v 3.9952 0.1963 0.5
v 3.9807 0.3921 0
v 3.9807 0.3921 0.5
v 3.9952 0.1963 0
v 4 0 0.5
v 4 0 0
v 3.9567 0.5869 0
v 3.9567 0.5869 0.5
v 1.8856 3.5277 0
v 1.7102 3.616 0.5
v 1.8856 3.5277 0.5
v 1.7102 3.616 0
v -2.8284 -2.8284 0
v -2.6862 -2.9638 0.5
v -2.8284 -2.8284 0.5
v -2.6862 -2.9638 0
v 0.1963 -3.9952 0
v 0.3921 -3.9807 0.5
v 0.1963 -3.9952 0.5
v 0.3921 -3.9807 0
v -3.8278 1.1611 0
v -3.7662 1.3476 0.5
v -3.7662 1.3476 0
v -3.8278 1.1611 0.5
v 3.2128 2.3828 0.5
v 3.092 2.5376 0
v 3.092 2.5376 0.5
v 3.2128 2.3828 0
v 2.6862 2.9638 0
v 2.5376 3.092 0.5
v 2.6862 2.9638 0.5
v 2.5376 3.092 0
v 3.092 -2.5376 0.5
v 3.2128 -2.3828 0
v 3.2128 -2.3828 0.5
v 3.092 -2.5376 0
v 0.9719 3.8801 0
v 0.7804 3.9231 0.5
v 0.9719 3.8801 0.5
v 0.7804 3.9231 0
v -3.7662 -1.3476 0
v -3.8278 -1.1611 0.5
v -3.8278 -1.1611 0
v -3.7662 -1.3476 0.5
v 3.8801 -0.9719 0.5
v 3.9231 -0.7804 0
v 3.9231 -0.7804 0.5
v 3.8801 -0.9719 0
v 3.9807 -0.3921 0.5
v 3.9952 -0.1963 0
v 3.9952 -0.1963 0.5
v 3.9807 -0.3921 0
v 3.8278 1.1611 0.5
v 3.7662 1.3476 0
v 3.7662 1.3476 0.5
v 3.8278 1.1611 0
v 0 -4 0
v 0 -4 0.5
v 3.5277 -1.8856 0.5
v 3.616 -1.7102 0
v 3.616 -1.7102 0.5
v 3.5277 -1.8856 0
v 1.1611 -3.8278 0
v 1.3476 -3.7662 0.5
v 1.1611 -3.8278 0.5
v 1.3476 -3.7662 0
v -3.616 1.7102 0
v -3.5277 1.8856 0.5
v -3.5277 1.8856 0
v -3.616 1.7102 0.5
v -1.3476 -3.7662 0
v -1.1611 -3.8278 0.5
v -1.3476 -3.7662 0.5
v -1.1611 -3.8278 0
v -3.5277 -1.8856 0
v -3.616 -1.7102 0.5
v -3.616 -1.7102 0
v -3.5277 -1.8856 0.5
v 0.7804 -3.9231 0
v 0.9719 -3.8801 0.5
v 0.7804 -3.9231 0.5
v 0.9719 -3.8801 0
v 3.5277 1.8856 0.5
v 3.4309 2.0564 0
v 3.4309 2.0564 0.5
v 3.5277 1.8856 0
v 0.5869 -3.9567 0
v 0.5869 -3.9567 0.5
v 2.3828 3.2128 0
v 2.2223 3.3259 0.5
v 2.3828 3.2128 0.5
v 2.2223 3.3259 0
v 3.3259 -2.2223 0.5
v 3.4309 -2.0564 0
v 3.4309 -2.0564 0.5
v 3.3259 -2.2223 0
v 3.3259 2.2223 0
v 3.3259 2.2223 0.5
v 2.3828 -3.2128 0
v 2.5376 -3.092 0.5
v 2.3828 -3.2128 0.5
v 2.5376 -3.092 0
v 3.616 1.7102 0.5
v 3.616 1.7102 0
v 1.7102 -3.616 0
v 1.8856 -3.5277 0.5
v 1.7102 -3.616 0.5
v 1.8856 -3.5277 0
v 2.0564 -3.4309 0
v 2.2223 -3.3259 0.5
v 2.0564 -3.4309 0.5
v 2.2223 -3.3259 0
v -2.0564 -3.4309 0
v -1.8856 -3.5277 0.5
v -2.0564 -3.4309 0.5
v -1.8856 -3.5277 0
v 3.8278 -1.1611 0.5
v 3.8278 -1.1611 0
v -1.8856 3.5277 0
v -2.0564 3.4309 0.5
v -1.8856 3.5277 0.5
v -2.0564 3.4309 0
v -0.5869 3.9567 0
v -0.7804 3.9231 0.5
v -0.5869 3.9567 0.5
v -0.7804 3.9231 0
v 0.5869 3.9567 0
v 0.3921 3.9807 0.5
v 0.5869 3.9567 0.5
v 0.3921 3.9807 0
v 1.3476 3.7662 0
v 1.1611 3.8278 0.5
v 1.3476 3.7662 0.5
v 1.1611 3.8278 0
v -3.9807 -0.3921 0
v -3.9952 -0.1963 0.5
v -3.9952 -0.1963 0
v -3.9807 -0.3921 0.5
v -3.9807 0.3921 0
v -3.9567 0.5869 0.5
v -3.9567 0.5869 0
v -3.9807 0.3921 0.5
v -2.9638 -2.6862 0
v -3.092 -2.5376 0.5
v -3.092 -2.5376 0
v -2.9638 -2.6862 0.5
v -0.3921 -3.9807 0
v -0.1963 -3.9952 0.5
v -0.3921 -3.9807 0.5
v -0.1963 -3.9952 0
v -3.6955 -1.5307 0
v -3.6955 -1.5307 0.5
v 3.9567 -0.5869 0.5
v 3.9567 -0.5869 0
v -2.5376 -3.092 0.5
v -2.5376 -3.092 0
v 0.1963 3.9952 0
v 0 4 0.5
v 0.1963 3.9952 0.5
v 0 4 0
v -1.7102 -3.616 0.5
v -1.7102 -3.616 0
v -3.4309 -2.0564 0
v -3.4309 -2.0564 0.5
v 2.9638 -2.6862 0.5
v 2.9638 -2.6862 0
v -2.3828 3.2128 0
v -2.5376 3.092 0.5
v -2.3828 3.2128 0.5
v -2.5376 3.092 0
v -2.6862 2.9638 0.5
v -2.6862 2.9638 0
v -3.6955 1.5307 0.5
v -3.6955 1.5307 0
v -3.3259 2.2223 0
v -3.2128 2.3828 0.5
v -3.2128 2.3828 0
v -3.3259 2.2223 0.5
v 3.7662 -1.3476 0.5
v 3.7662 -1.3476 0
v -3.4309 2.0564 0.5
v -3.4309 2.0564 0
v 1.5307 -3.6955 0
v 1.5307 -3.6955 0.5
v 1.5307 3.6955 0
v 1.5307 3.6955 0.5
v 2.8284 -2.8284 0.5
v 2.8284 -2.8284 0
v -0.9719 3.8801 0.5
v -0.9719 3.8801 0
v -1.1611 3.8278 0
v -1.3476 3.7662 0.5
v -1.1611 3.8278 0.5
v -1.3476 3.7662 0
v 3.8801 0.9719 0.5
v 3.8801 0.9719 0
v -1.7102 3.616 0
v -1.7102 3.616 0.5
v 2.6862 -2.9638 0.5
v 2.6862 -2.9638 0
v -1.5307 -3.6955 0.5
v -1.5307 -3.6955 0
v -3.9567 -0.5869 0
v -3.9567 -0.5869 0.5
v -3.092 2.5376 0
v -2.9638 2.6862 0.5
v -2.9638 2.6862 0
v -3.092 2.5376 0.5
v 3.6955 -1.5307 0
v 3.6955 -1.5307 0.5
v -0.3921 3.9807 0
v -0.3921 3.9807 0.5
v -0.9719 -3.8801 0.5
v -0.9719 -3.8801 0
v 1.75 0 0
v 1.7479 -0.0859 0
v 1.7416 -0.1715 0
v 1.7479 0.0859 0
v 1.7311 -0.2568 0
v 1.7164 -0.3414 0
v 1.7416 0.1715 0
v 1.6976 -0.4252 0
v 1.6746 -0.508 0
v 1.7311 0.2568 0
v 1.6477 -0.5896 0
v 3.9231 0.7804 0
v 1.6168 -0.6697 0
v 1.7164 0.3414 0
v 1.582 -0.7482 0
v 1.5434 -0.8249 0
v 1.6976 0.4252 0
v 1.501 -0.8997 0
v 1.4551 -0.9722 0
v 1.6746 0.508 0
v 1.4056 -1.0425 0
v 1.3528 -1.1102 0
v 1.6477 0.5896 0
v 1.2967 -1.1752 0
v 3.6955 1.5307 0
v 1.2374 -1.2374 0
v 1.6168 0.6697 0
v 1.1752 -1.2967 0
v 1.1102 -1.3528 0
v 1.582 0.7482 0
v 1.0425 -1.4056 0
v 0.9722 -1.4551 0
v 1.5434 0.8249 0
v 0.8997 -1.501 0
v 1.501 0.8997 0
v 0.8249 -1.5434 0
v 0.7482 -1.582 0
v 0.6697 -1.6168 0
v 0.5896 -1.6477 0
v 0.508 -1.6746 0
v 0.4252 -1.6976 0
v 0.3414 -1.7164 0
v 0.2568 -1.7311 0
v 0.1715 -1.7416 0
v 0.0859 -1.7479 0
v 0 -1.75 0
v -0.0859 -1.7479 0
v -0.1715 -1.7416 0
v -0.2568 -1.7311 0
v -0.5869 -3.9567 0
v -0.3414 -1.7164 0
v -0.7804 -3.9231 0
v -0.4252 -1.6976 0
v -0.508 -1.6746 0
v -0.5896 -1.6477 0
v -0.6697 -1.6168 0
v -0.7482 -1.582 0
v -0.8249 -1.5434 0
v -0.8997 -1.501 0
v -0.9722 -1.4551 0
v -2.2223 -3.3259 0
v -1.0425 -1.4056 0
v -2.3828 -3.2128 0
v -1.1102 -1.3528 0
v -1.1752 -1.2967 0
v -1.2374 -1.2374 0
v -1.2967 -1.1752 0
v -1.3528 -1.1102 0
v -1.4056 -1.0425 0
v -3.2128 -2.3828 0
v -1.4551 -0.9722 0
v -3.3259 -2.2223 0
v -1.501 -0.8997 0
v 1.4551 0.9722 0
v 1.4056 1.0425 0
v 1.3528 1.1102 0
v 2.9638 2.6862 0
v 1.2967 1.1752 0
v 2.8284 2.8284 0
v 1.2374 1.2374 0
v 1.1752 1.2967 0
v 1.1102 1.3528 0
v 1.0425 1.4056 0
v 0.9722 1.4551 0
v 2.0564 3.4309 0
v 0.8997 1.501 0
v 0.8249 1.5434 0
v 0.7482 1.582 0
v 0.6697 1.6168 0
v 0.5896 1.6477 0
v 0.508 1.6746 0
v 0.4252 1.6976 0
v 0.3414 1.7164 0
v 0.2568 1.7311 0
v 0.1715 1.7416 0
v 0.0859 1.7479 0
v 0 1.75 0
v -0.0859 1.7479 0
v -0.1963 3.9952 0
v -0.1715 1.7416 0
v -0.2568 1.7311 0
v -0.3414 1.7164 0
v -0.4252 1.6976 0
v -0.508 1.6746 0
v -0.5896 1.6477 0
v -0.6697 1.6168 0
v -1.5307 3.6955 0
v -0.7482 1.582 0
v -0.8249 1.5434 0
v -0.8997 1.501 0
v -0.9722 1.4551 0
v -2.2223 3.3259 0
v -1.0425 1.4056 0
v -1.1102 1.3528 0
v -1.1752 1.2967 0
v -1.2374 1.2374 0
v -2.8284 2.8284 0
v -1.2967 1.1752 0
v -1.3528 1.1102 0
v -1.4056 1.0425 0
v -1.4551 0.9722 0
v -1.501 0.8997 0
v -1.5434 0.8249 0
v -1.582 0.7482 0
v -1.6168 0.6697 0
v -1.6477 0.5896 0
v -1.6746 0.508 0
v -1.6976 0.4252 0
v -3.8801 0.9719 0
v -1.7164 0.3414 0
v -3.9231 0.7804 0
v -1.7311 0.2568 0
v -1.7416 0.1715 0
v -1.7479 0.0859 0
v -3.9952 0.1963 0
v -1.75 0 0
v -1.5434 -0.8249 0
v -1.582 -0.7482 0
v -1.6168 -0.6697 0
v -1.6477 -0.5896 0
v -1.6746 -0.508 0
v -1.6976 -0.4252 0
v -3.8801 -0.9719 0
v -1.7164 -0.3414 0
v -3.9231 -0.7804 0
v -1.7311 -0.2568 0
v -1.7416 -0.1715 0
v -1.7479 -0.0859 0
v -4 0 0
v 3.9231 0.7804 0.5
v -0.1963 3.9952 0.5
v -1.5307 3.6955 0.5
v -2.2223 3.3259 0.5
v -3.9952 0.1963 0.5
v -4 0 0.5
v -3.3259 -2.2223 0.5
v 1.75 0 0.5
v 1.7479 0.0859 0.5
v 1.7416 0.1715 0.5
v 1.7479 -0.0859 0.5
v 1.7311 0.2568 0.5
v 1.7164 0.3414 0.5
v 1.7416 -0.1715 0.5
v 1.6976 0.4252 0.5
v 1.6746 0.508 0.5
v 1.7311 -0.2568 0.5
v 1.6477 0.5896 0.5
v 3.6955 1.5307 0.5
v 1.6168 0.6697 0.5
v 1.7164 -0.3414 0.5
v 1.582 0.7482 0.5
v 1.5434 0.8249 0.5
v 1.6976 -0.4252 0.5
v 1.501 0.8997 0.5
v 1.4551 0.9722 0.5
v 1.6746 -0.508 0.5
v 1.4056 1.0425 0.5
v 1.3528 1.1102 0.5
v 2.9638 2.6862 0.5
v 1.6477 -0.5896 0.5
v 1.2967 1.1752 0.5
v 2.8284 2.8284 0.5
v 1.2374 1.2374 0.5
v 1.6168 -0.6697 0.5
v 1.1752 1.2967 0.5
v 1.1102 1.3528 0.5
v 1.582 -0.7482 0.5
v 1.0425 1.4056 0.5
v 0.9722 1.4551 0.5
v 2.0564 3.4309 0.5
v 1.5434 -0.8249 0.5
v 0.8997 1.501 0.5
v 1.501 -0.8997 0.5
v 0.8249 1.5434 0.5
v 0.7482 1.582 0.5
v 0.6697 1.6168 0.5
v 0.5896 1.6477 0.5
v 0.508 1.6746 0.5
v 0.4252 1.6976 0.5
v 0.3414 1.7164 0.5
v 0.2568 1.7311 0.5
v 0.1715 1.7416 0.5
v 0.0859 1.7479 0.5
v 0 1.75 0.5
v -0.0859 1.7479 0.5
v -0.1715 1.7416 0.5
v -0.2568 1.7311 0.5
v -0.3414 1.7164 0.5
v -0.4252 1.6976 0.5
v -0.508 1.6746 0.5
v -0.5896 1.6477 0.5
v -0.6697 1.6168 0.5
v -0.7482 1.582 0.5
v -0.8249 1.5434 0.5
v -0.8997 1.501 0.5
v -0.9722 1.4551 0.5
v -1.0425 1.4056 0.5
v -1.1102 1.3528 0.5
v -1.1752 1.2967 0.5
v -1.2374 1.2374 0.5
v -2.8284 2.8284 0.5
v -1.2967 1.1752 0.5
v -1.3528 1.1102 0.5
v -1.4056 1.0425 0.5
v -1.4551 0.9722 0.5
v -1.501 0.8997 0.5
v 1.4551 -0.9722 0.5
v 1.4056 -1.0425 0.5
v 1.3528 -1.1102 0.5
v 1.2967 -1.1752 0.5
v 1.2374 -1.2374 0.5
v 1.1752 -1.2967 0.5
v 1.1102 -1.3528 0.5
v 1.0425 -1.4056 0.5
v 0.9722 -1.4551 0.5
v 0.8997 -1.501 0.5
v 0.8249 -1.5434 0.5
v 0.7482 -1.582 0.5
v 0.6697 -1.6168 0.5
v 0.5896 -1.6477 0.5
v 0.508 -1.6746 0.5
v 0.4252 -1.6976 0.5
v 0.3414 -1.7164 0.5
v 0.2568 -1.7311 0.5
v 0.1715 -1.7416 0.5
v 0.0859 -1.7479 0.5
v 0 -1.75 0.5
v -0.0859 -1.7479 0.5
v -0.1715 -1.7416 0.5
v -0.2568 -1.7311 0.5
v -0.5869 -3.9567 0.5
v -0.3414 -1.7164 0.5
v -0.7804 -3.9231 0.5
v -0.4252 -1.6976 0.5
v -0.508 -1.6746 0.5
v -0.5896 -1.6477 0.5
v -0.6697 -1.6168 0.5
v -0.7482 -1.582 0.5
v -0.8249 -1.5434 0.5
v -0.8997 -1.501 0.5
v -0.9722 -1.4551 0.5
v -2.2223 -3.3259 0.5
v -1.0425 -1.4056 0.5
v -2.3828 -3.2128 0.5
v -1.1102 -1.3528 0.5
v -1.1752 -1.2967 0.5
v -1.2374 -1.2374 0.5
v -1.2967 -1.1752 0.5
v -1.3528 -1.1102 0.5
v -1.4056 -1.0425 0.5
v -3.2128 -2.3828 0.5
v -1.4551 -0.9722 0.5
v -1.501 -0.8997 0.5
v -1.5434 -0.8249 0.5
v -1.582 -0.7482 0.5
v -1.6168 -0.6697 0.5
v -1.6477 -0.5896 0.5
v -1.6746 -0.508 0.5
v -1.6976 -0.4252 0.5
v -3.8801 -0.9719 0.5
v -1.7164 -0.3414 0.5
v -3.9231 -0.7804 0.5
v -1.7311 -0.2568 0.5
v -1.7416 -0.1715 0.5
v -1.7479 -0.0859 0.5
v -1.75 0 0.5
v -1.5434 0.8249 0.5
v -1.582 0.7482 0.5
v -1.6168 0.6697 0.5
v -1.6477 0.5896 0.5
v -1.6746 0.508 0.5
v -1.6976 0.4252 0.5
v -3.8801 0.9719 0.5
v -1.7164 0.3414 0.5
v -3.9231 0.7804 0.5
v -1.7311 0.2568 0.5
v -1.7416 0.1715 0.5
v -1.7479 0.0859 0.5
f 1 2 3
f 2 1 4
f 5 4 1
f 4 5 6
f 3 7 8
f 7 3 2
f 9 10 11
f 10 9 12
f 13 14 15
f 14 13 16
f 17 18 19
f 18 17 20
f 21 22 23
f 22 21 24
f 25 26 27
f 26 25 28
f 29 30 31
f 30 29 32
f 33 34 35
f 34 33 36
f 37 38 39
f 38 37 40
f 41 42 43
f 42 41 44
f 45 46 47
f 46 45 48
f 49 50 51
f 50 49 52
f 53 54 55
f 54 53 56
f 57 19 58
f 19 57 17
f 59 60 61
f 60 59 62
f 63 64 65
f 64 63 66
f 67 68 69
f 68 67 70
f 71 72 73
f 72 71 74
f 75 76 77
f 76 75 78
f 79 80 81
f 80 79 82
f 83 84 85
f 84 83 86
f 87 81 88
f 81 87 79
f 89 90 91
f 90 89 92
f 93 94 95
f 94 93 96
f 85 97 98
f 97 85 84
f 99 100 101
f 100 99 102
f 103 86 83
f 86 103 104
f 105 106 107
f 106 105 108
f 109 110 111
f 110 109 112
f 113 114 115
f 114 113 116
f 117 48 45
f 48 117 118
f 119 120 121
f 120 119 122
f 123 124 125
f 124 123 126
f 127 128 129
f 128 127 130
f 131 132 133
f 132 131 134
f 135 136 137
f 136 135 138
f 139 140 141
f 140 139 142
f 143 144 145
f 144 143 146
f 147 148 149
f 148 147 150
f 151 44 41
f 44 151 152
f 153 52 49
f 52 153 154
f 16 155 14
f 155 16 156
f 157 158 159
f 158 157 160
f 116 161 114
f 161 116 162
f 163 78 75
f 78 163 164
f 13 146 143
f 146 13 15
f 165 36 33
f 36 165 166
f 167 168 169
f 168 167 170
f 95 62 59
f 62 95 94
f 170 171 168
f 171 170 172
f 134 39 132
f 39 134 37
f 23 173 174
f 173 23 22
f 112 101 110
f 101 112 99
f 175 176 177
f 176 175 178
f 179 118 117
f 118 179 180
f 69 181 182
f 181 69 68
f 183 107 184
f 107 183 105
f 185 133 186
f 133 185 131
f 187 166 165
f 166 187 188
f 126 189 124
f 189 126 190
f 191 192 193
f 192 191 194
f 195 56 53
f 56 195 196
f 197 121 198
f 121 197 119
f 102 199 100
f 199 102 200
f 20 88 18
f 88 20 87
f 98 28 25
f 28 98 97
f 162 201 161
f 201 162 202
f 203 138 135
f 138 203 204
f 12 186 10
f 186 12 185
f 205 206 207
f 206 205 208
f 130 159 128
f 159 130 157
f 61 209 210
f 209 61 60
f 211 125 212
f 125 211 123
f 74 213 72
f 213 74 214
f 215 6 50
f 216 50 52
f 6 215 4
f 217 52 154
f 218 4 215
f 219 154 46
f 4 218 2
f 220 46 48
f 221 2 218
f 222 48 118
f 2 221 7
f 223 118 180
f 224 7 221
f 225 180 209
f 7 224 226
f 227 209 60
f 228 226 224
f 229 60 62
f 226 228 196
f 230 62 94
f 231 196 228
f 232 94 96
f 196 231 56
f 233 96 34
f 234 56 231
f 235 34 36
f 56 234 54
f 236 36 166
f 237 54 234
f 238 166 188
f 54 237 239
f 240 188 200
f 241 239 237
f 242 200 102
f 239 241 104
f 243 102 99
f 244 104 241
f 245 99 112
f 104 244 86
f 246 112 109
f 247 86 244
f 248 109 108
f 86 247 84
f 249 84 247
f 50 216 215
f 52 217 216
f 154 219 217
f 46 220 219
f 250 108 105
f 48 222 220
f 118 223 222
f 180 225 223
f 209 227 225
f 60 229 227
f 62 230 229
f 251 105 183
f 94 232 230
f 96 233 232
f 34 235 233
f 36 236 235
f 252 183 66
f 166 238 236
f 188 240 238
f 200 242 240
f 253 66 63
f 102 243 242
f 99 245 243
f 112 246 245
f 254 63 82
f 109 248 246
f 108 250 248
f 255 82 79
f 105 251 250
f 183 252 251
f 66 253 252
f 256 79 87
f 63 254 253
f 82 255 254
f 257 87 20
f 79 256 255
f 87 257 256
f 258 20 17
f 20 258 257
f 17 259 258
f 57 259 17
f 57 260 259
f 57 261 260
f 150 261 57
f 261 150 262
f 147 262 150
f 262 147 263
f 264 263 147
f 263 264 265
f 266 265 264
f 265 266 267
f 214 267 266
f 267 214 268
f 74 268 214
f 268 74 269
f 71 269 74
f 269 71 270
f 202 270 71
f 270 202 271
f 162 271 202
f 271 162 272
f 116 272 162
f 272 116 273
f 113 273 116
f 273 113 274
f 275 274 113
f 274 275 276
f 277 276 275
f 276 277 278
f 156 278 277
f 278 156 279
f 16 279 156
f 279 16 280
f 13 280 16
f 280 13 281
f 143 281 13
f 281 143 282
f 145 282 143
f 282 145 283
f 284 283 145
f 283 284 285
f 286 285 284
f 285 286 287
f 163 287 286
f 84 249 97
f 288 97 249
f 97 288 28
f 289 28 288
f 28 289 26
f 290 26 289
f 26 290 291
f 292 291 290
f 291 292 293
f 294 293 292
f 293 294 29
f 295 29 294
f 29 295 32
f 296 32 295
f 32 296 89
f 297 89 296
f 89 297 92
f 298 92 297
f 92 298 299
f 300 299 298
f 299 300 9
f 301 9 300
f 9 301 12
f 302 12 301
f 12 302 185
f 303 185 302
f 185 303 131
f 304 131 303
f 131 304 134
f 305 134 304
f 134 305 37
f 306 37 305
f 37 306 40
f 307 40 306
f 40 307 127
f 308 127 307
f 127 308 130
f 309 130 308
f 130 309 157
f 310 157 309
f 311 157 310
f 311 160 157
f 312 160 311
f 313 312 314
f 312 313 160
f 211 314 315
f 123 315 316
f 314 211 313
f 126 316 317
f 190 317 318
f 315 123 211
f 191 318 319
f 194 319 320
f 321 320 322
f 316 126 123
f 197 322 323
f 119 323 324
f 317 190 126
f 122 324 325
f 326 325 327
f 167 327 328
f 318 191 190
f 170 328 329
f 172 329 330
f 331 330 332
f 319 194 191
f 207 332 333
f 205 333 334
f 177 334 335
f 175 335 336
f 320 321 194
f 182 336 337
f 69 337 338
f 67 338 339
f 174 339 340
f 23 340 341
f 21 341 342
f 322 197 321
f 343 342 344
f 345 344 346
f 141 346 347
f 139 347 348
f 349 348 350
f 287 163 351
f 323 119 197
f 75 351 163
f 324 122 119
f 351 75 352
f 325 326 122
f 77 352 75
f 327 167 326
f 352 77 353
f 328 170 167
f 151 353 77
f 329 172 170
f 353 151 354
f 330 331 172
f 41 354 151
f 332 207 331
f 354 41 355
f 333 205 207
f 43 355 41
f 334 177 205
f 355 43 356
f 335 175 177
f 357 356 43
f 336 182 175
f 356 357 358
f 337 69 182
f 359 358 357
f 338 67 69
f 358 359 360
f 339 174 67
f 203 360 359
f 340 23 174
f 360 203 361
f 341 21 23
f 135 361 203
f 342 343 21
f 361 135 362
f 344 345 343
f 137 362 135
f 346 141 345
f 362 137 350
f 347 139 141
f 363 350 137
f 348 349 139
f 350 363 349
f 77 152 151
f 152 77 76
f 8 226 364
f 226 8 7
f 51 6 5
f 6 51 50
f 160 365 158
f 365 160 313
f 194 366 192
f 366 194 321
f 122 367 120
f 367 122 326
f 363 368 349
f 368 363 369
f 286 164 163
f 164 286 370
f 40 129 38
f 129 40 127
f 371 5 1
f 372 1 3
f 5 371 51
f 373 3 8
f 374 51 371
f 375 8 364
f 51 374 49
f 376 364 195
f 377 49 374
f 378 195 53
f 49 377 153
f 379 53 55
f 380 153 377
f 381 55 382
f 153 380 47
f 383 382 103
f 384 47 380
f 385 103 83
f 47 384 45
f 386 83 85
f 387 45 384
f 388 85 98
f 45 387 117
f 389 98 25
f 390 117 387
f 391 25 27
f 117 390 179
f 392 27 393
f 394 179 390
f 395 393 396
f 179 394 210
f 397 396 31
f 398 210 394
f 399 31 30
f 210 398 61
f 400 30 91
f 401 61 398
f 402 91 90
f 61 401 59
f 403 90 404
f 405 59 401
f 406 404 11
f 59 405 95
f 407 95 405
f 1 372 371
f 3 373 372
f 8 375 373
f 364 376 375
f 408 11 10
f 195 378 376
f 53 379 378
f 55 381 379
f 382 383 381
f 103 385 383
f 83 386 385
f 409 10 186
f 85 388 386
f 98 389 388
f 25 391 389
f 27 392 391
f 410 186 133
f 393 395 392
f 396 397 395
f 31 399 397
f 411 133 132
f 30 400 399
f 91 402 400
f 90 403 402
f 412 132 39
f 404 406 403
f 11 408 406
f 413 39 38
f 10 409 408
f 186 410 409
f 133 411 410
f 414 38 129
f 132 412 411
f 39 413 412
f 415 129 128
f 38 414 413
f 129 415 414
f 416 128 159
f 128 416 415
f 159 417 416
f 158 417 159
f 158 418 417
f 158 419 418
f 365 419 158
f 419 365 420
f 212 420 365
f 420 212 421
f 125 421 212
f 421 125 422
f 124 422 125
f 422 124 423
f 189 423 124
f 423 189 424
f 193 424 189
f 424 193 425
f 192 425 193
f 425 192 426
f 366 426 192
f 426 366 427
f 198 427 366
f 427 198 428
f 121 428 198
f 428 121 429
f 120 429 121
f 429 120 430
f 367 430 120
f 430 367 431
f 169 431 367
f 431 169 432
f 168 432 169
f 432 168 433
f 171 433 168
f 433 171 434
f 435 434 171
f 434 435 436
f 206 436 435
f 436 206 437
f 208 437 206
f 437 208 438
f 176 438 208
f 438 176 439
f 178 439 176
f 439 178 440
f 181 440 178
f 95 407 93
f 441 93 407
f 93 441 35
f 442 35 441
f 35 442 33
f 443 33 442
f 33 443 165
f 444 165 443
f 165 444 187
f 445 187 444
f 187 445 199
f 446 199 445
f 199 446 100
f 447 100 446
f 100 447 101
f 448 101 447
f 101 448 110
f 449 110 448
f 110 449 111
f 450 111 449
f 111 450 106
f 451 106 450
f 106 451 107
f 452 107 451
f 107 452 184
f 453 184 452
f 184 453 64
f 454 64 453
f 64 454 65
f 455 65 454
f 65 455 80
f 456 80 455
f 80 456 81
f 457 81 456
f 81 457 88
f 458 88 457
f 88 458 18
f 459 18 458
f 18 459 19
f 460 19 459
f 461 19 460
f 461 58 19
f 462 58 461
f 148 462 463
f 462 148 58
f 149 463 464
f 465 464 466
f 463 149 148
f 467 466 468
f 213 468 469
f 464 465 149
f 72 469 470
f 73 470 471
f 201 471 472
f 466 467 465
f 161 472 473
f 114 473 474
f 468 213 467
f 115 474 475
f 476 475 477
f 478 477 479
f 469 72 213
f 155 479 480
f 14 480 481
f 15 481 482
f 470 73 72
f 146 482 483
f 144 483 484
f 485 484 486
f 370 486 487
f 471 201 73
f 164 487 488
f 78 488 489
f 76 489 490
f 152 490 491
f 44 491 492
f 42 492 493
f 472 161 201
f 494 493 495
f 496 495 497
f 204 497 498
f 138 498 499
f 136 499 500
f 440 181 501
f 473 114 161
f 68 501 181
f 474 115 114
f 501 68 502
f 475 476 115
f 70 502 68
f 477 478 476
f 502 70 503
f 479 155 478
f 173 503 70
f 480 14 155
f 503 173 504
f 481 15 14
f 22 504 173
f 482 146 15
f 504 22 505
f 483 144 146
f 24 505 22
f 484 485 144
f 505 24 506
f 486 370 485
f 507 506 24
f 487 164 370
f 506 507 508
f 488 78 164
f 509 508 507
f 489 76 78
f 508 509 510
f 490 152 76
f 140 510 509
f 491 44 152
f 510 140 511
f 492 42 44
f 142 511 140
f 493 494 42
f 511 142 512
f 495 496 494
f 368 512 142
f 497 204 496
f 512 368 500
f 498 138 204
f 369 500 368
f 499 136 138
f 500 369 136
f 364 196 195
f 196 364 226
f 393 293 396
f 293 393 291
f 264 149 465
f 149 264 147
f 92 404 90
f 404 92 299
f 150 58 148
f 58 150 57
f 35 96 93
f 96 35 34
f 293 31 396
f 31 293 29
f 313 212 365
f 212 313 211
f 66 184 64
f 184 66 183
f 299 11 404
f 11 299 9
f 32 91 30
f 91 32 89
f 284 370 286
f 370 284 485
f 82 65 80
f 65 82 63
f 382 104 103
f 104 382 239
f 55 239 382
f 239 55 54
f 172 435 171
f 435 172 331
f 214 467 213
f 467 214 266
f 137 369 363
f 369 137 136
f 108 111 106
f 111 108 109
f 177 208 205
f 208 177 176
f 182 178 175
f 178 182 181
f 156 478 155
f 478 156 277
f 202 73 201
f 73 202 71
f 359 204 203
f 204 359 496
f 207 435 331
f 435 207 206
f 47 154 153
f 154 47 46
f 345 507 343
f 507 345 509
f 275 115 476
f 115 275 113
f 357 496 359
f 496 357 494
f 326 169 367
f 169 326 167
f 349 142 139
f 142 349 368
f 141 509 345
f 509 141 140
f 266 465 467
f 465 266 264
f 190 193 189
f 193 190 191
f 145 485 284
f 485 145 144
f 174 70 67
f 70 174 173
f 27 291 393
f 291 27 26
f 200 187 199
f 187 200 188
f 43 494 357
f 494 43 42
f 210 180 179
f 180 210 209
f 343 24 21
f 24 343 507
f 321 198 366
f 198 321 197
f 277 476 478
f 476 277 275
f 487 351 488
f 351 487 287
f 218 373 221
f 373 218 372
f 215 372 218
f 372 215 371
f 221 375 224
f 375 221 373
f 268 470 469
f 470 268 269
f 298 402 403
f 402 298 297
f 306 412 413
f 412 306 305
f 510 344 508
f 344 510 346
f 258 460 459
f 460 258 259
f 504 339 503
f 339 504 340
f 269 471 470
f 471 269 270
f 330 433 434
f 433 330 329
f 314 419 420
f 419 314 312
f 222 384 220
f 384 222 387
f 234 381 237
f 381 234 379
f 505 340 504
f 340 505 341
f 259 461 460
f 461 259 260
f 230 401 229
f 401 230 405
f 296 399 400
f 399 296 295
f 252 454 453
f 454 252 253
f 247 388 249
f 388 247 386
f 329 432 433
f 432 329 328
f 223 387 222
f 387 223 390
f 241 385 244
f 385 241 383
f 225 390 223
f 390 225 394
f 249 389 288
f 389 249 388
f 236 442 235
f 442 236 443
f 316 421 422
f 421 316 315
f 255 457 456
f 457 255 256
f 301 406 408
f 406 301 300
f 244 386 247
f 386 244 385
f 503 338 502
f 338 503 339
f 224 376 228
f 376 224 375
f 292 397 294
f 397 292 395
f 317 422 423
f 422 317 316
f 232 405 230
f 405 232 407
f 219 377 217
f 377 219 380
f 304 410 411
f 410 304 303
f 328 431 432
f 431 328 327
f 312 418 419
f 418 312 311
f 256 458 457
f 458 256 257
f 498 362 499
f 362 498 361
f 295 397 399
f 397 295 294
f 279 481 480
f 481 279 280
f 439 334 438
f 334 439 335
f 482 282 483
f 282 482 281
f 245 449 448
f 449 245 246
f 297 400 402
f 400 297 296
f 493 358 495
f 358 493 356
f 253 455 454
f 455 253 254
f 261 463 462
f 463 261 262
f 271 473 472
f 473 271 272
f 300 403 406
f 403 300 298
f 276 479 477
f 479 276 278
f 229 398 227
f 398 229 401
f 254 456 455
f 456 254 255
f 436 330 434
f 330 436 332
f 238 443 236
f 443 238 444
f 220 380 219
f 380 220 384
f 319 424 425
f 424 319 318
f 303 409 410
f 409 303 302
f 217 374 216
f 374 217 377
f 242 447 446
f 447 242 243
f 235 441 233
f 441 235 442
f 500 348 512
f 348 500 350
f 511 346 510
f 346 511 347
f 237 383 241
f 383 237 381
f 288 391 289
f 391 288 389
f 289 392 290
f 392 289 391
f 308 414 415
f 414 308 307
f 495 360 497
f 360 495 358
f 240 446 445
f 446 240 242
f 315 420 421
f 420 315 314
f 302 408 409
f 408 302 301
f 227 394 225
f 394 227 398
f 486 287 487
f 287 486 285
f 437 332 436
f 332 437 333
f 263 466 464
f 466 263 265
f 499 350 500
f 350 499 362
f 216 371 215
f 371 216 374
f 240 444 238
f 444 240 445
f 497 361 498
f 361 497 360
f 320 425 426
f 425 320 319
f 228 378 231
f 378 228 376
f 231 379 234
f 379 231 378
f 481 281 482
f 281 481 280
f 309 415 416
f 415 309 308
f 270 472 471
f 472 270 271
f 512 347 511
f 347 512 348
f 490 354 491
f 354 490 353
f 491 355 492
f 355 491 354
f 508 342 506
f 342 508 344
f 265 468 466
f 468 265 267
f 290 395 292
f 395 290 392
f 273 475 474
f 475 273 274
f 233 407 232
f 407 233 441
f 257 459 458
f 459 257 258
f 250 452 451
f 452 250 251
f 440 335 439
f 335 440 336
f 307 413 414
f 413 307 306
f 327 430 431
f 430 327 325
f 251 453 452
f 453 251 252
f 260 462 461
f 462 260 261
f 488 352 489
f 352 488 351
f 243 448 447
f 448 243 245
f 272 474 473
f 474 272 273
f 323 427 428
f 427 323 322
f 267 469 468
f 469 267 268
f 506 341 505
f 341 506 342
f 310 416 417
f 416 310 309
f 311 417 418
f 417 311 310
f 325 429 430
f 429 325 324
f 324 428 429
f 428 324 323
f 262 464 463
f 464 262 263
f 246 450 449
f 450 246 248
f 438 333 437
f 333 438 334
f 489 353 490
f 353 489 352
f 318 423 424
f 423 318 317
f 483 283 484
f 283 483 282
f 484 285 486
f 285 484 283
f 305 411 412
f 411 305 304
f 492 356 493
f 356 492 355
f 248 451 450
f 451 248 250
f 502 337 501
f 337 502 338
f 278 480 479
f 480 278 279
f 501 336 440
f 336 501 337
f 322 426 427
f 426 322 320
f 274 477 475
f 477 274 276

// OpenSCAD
$fn = 128;

inner_d = 3.5;
outer_d = 8.0;
thickness = 0.5;

difference() {
  cylinder(d = outer_d, h = thickness);
  cylinder(d = inner_d, h = thickness + 0.2);
}
